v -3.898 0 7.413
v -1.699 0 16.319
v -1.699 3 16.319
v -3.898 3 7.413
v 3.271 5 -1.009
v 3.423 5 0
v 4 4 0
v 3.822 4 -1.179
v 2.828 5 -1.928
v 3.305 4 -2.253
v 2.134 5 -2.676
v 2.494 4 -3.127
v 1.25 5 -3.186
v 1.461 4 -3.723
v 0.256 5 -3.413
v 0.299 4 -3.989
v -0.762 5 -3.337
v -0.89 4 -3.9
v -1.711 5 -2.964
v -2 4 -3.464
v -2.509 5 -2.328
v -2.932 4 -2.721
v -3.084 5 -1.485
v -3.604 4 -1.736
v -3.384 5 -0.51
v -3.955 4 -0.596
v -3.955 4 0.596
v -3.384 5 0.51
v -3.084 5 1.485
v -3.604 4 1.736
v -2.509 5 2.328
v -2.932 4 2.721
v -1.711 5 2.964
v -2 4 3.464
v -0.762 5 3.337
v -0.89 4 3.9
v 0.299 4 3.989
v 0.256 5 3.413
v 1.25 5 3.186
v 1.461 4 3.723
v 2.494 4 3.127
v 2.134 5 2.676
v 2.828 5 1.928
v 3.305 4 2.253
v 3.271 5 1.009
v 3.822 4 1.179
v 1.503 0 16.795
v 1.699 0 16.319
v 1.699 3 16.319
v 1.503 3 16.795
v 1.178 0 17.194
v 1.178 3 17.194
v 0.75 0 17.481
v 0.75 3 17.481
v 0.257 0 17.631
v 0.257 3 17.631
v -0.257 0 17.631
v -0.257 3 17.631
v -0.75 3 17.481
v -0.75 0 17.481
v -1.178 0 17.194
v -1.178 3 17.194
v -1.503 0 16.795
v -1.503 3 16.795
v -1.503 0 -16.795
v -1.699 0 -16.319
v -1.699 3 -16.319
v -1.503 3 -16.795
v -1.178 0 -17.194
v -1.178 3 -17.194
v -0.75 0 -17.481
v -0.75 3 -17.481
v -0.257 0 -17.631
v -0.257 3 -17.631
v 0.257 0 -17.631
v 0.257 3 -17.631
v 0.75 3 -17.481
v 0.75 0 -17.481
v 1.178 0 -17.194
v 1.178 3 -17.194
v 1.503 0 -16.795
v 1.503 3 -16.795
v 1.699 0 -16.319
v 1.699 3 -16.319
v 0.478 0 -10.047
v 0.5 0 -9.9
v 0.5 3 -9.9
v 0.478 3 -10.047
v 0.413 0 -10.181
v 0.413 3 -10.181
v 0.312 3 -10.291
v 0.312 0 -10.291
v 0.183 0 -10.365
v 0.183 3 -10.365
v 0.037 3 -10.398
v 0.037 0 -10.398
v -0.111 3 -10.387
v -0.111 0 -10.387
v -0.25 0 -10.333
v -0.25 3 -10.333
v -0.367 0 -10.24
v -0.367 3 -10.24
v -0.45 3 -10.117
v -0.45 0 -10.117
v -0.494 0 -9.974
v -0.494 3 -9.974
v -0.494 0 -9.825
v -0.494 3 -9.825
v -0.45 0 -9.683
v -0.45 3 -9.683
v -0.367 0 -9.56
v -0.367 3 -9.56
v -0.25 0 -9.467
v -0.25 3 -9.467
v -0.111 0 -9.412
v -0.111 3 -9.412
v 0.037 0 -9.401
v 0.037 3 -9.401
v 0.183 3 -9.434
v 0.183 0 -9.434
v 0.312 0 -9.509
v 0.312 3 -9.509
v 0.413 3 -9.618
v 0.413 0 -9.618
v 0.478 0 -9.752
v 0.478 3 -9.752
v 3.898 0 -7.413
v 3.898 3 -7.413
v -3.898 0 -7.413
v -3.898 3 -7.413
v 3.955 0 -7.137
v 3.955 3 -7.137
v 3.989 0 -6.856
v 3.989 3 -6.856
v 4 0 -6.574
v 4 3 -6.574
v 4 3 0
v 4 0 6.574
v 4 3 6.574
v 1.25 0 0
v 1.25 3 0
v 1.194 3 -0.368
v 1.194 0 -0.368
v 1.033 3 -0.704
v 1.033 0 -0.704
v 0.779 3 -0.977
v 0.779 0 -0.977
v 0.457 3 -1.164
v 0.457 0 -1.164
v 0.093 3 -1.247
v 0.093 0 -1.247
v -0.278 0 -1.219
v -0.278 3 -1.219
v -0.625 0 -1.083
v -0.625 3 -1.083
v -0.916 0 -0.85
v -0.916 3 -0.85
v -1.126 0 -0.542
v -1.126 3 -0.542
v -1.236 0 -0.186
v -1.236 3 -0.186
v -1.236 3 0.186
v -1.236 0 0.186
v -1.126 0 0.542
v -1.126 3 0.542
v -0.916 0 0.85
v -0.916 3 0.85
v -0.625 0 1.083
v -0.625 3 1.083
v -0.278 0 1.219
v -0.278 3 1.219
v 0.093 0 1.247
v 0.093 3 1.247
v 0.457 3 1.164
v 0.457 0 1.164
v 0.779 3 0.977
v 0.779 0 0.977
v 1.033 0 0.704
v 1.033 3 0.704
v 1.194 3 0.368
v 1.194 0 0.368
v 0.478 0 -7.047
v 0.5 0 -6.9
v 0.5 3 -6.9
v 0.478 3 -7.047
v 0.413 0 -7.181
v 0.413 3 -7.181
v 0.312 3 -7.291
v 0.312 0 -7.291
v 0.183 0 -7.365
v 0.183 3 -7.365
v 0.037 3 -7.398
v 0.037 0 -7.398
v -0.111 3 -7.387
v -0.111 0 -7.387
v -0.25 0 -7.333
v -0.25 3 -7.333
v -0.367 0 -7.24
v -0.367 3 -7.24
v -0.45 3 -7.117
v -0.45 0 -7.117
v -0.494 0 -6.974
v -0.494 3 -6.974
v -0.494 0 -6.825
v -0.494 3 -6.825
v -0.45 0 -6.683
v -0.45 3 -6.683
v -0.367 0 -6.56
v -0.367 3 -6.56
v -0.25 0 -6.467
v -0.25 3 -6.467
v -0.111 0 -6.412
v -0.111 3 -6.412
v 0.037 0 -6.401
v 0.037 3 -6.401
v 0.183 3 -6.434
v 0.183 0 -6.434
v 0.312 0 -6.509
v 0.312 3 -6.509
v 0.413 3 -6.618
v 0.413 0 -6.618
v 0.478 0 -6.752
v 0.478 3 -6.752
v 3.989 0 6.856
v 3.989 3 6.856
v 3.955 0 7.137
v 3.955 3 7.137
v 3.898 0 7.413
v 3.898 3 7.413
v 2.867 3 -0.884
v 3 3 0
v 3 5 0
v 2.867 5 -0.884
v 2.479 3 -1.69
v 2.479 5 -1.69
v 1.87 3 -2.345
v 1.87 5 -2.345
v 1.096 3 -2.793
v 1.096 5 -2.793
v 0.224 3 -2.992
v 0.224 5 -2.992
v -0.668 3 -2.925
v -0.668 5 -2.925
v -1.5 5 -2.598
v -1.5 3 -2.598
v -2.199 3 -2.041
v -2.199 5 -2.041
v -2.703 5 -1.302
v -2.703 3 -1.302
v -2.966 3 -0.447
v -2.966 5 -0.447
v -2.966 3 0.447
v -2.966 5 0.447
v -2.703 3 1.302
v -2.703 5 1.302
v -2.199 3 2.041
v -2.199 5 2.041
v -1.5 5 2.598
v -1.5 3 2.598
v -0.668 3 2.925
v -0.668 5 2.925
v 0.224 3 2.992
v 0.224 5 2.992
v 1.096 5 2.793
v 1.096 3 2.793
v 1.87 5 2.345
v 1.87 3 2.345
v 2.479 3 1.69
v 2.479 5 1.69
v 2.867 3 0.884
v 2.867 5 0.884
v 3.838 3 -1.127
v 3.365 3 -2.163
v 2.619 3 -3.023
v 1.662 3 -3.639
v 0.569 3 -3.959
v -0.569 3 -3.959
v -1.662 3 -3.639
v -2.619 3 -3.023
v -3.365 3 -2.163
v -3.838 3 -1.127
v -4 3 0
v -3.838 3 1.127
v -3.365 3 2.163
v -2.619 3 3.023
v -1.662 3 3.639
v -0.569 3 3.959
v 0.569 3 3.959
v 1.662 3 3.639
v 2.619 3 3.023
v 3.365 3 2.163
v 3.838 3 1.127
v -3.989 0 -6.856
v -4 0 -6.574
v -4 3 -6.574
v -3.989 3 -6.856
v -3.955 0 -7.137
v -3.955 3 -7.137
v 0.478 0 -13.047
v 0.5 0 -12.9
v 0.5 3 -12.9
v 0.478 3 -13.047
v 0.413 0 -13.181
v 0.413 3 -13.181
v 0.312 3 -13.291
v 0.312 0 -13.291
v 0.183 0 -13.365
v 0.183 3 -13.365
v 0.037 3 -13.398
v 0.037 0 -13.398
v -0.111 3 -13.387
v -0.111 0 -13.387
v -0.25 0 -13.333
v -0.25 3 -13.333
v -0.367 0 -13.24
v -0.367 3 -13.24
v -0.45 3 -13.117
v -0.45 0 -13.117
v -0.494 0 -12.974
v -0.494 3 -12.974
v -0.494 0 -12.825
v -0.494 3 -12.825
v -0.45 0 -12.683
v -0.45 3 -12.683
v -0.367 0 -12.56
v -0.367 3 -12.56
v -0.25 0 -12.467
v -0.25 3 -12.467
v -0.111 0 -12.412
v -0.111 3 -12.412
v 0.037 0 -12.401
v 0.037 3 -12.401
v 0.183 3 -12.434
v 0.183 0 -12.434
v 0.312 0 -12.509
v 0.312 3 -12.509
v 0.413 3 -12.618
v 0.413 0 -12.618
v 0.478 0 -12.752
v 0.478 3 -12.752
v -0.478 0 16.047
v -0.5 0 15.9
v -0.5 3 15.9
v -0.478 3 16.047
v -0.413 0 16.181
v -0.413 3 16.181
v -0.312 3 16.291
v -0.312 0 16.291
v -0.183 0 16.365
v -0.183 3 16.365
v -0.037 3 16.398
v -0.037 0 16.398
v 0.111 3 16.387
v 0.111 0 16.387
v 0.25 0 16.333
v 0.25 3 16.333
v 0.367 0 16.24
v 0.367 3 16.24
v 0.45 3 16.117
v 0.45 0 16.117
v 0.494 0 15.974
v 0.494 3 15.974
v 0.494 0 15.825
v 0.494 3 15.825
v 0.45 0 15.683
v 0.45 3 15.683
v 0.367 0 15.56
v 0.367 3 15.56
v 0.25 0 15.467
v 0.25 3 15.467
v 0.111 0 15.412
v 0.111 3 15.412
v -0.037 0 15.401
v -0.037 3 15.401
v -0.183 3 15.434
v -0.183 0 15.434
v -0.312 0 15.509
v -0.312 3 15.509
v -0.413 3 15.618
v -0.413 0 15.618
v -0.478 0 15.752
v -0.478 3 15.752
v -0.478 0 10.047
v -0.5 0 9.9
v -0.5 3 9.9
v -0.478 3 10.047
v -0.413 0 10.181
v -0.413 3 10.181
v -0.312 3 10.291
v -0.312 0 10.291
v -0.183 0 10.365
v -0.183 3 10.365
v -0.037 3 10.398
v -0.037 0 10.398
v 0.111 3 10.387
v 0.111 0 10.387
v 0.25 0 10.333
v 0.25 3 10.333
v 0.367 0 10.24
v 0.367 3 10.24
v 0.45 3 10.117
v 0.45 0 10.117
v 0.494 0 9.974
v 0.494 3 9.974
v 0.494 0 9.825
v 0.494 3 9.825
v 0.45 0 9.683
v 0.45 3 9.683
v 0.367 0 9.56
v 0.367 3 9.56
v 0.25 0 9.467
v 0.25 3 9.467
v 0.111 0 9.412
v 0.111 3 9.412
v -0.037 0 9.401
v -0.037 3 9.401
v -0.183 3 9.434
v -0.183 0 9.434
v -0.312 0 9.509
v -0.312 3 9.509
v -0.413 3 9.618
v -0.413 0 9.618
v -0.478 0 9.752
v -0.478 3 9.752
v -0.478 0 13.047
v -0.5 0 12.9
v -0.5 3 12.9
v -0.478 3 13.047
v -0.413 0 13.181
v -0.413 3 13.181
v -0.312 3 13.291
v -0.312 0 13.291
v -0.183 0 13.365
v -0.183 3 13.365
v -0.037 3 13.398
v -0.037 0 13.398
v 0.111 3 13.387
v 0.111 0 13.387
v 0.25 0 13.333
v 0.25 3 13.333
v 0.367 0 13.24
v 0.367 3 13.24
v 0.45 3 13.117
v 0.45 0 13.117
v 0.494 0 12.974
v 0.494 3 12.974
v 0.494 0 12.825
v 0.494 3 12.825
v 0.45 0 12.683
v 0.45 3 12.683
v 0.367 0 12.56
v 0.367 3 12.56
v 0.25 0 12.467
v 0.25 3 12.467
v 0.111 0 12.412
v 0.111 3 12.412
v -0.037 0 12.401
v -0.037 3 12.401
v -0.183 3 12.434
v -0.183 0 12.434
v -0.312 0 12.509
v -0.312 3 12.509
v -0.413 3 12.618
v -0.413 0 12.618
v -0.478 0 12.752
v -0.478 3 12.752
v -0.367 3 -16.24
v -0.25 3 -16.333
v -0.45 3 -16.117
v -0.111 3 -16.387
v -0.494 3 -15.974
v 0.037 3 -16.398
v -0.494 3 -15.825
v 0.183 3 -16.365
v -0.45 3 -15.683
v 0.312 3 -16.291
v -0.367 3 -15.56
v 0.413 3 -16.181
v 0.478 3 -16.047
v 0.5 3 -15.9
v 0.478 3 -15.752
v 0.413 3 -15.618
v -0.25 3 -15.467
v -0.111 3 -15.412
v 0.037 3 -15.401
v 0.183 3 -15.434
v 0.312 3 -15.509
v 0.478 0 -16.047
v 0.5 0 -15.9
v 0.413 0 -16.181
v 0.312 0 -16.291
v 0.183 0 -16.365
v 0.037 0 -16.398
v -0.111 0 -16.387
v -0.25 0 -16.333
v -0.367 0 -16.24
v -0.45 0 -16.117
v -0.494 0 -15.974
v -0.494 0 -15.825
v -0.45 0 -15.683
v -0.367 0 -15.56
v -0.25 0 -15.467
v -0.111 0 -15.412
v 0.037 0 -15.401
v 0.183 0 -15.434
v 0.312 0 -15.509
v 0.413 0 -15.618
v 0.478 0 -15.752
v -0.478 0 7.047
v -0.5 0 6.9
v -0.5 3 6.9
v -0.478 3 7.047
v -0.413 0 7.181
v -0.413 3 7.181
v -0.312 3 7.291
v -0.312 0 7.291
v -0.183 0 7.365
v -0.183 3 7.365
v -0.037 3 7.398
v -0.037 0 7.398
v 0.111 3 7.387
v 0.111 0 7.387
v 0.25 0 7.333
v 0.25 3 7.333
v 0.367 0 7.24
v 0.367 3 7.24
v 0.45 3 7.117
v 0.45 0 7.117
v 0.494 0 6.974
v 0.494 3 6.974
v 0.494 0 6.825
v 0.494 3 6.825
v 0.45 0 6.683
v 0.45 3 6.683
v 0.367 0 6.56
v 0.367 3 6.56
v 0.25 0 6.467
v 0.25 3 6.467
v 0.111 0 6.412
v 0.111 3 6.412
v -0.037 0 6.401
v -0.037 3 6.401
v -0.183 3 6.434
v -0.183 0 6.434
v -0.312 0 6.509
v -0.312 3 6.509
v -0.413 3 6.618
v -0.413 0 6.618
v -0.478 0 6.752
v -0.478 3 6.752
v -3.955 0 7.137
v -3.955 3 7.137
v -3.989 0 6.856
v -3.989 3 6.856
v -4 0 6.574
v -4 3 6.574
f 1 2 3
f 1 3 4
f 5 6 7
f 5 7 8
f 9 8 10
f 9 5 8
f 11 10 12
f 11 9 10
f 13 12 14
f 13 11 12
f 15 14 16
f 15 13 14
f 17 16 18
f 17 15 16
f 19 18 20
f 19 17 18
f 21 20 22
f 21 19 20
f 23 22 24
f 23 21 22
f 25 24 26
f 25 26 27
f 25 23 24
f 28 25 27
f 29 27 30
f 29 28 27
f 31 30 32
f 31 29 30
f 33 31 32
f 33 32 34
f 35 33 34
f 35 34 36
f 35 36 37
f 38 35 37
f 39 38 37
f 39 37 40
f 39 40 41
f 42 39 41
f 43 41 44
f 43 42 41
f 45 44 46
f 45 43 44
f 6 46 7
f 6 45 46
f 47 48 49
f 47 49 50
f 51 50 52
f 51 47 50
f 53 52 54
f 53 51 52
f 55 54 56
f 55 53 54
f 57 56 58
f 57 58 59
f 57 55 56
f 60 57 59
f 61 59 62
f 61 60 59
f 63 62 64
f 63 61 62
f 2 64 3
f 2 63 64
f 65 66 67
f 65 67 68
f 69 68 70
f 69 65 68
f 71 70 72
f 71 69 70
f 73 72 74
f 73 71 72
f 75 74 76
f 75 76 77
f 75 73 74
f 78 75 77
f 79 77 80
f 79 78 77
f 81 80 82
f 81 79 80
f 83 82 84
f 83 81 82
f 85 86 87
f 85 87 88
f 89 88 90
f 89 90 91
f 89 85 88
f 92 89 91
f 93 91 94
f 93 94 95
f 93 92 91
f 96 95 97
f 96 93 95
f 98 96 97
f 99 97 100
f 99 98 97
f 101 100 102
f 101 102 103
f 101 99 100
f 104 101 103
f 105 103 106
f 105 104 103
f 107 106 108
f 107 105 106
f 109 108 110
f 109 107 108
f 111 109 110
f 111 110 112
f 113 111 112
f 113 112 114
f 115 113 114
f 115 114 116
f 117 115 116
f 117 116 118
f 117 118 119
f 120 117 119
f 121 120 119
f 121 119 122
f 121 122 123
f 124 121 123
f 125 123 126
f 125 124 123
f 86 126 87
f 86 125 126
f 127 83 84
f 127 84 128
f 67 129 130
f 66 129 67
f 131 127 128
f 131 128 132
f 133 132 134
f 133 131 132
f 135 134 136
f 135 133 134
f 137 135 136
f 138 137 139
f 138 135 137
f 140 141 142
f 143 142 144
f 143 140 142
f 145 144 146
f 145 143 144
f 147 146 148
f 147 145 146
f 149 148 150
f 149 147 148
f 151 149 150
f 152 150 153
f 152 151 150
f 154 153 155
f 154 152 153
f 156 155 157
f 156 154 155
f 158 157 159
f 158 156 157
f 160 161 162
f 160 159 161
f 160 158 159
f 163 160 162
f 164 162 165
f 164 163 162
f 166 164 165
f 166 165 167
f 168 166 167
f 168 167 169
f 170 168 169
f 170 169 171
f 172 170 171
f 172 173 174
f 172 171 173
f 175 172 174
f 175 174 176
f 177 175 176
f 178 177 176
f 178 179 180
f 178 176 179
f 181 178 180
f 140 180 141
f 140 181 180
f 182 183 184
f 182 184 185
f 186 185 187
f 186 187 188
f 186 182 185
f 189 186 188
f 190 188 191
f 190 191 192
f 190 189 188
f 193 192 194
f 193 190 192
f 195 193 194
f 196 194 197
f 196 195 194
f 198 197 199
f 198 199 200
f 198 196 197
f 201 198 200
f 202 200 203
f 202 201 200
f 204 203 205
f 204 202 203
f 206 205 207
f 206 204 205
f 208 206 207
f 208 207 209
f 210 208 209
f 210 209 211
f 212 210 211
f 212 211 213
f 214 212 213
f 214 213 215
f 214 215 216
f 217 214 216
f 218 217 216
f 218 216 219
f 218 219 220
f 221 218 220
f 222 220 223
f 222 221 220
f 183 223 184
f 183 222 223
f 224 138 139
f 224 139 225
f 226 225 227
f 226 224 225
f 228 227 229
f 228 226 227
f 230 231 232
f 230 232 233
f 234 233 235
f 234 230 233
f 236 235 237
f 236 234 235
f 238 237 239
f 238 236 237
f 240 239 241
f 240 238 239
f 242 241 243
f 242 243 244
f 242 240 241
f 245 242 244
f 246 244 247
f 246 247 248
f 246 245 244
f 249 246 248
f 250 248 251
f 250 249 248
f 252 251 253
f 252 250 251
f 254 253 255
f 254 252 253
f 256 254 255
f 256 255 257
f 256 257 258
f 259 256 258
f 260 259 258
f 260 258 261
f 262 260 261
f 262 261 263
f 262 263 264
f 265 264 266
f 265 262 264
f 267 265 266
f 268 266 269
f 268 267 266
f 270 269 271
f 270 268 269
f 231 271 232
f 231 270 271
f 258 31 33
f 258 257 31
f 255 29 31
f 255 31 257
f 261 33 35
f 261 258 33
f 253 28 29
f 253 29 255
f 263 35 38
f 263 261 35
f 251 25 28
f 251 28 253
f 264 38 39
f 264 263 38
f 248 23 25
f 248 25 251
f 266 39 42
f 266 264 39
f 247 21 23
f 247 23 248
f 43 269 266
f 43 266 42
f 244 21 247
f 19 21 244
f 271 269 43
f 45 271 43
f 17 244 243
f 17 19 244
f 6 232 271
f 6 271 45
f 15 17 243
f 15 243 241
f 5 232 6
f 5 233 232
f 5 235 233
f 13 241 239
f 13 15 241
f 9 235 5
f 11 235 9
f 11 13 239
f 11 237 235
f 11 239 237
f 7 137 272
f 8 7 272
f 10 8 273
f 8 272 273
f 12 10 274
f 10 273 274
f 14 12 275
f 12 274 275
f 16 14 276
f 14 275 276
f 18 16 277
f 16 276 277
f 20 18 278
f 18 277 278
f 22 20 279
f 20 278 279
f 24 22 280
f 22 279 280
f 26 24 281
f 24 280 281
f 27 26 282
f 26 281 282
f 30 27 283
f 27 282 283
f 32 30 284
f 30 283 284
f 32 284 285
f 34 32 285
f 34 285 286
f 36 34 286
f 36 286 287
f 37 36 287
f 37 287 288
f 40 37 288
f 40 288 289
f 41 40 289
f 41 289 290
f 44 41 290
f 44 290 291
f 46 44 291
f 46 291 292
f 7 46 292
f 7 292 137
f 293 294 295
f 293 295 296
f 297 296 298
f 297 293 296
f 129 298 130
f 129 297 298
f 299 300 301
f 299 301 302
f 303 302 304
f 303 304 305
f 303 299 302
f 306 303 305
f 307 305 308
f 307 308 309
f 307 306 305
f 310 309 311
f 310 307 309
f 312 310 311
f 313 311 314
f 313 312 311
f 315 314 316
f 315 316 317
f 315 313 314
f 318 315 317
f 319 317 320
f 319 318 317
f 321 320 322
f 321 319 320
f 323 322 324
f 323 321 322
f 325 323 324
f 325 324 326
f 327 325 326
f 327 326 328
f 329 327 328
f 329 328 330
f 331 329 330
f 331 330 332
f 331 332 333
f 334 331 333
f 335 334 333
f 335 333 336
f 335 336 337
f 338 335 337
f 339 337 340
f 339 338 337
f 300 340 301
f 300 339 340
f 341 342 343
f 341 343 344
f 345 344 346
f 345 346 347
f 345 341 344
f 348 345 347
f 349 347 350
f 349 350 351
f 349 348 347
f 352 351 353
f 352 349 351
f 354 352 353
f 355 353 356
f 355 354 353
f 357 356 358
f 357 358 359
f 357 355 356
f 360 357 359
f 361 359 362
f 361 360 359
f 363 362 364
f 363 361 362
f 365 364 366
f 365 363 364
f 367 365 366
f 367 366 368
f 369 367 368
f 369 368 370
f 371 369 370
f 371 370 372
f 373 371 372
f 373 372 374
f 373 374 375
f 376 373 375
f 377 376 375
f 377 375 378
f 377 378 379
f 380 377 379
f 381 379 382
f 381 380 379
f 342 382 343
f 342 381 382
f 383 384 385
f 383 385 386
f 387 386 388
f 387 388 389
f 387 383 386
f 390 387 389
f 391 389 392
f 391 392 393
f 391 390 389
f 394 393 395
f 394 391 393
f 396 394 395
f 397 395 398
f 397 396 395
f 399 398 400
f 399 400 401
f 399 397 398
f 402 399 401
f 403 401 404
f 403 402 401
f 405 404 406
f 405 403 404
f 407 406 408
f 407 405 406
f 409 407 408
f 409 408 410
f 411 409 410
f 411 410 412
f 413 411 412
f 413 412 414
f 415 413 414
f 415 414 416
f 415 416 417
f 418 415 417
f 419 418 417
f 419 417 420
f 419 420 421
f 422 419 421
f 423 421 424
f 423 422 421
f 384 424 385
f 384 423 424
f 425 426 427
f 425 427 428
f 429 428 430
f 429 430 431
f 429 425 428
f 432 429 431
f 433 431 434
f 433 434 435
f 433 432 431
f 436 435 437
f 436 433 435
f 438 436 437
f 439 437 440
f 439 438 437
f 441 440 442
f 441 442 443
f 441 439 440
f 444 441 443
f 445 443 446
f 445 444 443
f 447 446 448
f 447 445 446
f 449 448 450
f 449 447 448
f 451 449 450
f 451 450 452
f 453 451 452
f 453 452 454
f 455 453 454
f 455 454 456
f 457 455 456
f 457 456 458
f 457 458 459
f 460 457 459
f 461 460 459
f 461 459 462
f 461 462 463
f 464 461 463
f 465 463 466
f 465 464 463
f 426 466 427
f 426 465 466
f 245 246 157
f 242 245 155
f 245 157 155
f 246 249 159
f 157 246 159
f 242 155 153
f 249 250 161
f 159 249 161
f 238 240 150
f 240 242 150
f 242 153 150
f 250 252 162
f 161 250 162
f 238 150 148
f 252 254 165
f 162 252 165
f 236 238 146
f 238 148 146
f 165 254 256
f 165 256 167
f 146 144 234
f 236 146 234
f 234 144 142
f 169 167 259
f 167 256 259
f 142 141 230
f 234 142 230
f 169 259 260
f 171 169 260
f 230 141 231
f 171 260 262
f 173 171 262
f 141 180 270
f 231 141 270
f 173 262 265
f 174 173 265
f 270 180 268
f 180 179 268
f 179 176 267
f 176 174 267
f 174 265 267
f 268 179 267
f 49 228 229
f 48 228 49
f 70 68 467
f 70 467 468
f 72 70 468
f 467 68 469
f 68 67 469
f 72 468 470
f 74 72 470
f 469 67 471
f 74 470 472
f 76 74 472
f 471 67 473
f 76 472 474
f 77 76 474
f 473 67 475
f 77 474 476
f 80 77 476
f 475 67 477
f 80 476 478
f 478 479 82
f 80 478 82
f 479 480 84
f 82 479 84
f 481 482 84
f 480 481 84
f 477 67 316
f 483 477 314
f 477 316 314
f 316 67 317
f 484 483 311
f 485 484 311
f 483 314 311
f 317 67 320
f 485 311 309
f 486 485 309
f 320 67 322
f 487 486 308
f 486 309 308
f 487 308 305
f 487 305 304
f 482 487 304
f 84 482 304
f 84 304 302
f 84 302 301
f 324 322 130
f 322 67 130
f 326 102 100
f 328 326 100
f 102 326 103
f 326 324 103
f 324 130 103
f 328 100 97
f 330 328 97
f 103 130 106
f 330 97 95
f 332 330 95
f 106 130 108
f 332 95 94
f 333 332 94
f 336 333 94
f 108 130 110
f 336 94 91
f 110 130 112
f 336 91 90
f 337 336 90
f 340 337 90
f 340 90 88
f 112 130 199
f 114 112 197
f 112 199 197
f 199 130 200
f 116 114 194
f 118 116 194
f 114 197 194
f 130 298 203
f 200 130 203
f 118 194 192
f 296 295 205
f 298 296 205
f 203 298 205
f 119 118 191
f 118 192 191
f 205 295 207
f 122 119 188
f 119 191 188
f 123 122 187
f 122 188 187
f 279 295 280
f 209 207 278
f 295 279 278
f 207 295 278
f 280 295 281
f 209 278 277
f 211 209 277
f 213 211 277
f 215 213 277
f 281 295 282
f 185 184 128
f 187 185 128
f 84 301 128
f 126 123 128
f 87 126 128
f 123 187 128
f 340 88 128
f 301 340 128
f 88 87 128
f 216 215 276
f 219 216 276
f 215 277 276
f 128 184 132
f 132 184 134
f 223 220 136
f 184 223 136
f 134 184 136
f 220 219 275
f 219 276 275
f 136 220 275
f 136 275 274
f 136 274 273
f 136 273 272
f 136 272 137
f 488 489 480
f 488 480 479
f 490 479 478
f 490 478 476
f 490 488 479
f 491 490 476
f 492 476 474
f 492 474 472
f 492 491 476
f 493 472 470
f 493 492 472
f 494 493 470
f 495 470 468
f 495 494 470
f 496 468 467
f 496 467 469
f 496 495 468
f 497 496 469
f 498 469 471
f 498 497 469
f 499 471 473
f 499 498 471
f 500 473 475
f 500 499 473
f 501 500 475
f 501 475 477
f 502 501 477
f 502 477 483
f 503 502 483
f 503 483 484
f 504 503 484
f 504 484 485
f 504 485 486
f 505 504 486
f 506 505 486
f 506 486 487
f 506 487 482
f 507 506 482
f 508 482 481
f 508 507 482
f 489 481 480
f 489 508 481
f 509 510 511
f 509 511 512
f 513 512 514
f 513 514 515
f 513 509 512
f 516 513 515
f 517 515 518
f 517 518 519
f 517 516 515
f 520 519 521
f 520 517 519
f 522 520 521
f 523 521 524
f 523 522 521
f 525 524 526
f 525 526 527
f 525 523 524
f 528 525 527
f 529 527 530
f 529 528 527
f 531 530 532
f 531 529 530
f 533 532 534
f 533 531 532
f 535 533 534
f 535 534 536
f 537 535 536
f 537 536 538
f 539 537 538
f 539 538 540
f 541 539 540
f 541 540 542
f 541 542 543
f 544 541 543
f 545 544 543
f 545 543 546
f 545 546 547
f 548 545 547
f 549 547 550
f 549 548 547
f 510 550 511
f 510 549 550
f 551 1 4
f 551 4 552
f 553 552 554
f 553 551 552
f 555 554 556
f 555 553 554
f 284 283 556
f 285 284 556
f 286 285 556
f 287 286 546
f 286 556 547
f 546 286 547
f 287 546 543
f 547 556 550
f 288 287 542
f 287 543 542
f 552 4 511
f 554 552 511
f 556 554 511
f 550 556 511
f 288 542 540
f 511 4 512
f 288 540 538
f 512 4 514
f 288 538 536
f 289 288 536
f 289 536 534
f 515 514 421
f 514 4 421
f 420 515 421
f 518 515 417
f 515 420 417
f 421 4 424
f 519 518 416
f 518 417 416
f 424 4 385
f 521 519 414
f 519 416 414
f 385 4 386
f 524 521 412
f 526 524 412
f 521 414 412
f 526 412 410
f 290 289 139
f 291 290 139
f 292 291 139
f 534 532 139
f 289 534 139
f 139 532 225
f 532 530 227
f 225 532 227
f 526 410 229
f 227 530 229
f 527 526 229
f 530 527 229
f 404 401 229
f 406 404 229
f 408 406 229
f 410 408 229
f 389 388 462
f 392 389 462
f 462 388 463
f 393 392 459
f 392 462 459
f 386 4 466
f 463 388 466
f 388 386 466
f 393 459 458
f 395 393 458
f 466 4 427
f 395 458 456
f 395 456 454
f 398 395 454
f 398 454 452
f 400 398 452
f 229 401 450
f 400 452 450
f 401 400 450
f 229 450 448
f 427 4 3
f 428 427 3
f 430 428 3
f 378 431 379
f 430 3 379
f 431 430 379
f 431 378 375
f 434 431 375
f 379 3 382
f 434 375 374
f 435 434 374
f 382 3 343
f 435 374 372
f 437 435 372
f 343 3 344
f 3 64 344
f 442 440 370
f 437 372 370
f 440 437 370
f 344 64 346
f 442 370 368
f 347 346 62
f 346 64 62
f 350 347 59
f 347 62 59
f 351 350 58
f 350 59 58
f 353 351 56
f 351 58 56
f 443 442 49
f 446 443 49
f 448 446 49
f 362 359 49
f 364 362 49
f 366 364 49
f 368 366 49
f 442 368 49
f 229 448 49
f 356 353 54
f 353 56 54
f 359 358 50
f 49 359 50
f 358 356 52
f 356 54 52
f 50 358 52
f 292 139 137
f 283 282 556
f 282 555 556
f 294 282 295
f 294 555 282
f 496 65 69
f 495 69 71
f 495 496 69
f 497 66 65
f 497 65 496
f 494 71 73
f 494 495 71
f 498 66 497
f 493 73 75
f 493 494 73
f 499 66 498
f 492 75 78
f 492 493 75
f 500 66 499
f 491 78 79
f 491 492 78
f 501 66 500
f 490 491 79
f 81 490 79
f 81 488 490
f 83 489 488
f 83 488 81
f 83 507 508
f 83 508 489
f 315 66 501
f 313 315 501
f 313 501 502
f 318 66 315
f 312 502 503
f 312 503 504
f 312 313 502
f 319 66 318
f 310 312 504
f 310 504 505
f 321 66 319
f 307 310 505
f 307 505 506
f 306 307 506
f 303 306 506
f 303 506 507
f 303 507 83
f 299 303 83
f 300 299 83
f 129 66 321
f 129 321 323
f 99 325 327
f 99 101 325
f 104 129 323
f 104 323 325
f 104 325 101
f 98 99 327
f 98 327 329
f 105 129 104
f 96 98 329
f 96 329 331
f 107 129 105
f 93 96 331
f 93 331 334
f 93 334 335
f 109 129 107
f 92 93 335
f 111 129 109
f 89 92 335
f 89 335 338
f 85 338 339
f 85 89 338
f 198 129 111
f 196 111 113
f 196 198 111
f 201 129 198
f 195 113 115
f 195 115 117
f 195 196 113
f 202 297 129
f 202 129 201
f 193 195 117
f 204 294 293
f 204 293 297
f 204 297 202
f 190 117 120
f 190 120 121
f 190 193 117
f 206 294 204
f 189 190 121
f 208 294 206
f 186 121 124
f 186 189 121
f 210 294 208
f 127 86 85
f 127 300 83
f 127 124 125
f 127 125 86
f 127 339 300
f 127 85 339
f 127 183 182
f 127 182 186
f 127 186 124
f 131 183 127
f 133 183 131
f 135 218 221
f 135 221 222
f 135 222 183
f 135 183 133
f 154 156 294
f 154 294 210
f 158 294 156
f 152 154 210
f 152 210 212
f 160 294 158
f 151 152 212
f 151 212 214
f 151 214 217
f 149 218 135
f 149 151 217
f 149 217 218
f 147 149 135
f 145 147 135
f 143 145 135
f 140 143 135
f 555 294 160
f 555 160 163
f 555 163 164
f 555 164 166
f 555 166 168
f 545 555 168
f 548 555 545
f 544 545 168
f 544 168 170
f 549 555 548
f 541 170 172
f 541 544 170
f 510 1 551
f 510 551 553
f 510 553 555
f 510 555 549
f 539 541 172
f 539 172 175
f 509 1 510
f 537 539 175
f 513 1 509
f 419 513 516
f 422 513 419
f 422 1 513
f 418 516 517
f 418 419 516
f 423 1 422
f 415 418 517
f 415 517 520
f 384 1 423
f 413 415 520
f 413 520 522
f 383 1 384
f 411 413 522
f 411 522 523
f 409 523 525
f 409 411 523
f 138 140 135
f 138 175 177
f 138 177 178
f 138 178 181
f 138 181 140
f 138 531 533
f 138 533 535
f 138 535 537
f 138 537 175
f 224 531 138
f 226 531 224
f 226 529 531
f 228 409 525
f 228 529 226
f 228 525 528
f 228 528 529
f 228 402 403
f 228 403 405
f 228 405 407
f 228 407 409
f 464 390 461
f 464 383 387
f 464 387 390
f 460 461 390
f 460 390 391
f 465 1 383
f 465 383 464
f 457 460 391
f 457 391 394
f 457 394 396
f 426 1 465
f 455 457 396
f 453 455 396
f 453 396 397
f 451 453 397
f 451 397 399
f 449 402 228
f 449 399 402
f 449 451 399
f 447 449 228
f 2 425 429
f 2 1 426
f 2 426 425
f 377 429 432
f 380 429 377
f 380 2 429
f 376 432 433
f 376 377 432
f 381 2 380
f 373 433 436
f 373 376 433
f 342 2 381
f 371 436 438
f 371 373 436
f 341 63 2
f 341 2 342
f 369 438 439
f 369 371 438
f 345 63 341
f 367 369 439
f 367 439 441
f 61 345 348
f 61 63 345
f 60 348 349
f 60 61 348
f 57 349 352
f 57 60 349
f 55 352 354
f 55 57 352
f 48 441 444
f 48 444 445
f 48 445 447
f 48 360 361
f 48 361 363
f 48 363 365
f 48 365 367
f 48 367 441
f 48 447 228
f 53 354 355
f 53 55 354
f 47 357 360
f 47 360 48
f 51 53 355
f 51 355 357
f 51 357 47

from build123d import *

# Parameters (mm, degrees)
CROQUIS1_R              = 0.5
SALIENTE_EXTRUIR1_DEPTH = 3
MATRIZC1_COUNT          = 2
CROQUIS2_R              = 4
CROQUIS2_R_2            = 3
SALIENTE_EXTRUIR2_DEPTH = 2
CHAFL_N1_SIZE           = 1
CHAFL_N1_SIZE2          = 0.577350269


with BuildPart() as part:
    # Croquis1 → Saliente-Extruir1 (new body)
    with BuildSketch(Plane(origin=(0, 0, 0), x_dir=(1, 0, 0), z_dir=(0, 1, 0))):
        with BuildLine():
            Line((-4, 0), (-4, 6.574293681))
            ThreePointArc((-4, 6.574293681), (-3.974394349, 6.996885575), (-3.897952052, 7.413294188))
            Line((-3.897952052, 7.413294188), (-1.698976026, 16.319147094))
            ThreePointArc((-1.698976026, 16.319147094), (0, 17.649646841), (1.698976026, 16.319147094))
            Line((1.698976026, 16.319147094), (3.897952052, 7.413294188))
            ThreePointArc((3.897952052, 7.413294188), (3.974394349, 6.996885575), (4, 6.574293681))
            Line((4, 6.574293681), (4, 0))
            Line((4, 0), (1.25, 0))
            ThreePointArc((1.25, 0), (0, 1.25), (-1.25, 0))
            Line((-1.25, 0), (-4, 0))
        make_face()
        with Locations((0, 15.899646841)):
            Circle(CROQUIS1_R, mode=Mode.SUBTRACT)
        with Locations((0, 12.899646841)):
            Circle(CROQUIS1_R, mode=Mode.SUBTRACT)
        with Locations((0, 9.899646841)):
            Circle(CROQUIS1_R, mode=Mode.SUBTRACT)
        with Locations((0, 6.899646841)):
            Circle(CROQUIS1_R, mode=Mode.SUBTRACT)
    saliente_extruir1 = extrude(amount=SALIENTE_EXTRUIR1_DEPTH)

    # MatrizC1: Saliente-Extruir1 ×2 about axis
    matrizc1_axis = Axis((0, 0, 0), (0, 1, 0))
    for i in range(1, MATRIZC1_COUNT):
        add(saliente_extruir1.rotate(matrizc1_axis, i * 360 / MATRIZC1_COUNT))

    # Croquis2 → Saliente-Extruir2 (add)
    with BuildSketch(Plane(origin=(0, 3, 0), x_dir=(1, 0, 0), z_dir=(0, 1, 0))):
        Circle(CROQUIS2_R)
        Circle(CROQUIS2_R_2, mode=Mode.SUBTRACT)
    extrude(amount=SALIENTE_EXTRUIR2_DEPTH)

    # Chaflán1
    chafl_n1_edges = [part.edges().sort_by_distance(p)[0] for p in [
        (-4, 5, 0),
    ]]
    chafl_n1_side = [part.faces().sort_by_distance(p)[0] for p in [
        (-4, 4, 0),
    ]]
    chamfer(chafl_n1_edges, length=CHAFL_N1_SIZE, length2=CHAFL_N1_SIZE2, reference=chafl_n1_side[0])


solid = part.part
